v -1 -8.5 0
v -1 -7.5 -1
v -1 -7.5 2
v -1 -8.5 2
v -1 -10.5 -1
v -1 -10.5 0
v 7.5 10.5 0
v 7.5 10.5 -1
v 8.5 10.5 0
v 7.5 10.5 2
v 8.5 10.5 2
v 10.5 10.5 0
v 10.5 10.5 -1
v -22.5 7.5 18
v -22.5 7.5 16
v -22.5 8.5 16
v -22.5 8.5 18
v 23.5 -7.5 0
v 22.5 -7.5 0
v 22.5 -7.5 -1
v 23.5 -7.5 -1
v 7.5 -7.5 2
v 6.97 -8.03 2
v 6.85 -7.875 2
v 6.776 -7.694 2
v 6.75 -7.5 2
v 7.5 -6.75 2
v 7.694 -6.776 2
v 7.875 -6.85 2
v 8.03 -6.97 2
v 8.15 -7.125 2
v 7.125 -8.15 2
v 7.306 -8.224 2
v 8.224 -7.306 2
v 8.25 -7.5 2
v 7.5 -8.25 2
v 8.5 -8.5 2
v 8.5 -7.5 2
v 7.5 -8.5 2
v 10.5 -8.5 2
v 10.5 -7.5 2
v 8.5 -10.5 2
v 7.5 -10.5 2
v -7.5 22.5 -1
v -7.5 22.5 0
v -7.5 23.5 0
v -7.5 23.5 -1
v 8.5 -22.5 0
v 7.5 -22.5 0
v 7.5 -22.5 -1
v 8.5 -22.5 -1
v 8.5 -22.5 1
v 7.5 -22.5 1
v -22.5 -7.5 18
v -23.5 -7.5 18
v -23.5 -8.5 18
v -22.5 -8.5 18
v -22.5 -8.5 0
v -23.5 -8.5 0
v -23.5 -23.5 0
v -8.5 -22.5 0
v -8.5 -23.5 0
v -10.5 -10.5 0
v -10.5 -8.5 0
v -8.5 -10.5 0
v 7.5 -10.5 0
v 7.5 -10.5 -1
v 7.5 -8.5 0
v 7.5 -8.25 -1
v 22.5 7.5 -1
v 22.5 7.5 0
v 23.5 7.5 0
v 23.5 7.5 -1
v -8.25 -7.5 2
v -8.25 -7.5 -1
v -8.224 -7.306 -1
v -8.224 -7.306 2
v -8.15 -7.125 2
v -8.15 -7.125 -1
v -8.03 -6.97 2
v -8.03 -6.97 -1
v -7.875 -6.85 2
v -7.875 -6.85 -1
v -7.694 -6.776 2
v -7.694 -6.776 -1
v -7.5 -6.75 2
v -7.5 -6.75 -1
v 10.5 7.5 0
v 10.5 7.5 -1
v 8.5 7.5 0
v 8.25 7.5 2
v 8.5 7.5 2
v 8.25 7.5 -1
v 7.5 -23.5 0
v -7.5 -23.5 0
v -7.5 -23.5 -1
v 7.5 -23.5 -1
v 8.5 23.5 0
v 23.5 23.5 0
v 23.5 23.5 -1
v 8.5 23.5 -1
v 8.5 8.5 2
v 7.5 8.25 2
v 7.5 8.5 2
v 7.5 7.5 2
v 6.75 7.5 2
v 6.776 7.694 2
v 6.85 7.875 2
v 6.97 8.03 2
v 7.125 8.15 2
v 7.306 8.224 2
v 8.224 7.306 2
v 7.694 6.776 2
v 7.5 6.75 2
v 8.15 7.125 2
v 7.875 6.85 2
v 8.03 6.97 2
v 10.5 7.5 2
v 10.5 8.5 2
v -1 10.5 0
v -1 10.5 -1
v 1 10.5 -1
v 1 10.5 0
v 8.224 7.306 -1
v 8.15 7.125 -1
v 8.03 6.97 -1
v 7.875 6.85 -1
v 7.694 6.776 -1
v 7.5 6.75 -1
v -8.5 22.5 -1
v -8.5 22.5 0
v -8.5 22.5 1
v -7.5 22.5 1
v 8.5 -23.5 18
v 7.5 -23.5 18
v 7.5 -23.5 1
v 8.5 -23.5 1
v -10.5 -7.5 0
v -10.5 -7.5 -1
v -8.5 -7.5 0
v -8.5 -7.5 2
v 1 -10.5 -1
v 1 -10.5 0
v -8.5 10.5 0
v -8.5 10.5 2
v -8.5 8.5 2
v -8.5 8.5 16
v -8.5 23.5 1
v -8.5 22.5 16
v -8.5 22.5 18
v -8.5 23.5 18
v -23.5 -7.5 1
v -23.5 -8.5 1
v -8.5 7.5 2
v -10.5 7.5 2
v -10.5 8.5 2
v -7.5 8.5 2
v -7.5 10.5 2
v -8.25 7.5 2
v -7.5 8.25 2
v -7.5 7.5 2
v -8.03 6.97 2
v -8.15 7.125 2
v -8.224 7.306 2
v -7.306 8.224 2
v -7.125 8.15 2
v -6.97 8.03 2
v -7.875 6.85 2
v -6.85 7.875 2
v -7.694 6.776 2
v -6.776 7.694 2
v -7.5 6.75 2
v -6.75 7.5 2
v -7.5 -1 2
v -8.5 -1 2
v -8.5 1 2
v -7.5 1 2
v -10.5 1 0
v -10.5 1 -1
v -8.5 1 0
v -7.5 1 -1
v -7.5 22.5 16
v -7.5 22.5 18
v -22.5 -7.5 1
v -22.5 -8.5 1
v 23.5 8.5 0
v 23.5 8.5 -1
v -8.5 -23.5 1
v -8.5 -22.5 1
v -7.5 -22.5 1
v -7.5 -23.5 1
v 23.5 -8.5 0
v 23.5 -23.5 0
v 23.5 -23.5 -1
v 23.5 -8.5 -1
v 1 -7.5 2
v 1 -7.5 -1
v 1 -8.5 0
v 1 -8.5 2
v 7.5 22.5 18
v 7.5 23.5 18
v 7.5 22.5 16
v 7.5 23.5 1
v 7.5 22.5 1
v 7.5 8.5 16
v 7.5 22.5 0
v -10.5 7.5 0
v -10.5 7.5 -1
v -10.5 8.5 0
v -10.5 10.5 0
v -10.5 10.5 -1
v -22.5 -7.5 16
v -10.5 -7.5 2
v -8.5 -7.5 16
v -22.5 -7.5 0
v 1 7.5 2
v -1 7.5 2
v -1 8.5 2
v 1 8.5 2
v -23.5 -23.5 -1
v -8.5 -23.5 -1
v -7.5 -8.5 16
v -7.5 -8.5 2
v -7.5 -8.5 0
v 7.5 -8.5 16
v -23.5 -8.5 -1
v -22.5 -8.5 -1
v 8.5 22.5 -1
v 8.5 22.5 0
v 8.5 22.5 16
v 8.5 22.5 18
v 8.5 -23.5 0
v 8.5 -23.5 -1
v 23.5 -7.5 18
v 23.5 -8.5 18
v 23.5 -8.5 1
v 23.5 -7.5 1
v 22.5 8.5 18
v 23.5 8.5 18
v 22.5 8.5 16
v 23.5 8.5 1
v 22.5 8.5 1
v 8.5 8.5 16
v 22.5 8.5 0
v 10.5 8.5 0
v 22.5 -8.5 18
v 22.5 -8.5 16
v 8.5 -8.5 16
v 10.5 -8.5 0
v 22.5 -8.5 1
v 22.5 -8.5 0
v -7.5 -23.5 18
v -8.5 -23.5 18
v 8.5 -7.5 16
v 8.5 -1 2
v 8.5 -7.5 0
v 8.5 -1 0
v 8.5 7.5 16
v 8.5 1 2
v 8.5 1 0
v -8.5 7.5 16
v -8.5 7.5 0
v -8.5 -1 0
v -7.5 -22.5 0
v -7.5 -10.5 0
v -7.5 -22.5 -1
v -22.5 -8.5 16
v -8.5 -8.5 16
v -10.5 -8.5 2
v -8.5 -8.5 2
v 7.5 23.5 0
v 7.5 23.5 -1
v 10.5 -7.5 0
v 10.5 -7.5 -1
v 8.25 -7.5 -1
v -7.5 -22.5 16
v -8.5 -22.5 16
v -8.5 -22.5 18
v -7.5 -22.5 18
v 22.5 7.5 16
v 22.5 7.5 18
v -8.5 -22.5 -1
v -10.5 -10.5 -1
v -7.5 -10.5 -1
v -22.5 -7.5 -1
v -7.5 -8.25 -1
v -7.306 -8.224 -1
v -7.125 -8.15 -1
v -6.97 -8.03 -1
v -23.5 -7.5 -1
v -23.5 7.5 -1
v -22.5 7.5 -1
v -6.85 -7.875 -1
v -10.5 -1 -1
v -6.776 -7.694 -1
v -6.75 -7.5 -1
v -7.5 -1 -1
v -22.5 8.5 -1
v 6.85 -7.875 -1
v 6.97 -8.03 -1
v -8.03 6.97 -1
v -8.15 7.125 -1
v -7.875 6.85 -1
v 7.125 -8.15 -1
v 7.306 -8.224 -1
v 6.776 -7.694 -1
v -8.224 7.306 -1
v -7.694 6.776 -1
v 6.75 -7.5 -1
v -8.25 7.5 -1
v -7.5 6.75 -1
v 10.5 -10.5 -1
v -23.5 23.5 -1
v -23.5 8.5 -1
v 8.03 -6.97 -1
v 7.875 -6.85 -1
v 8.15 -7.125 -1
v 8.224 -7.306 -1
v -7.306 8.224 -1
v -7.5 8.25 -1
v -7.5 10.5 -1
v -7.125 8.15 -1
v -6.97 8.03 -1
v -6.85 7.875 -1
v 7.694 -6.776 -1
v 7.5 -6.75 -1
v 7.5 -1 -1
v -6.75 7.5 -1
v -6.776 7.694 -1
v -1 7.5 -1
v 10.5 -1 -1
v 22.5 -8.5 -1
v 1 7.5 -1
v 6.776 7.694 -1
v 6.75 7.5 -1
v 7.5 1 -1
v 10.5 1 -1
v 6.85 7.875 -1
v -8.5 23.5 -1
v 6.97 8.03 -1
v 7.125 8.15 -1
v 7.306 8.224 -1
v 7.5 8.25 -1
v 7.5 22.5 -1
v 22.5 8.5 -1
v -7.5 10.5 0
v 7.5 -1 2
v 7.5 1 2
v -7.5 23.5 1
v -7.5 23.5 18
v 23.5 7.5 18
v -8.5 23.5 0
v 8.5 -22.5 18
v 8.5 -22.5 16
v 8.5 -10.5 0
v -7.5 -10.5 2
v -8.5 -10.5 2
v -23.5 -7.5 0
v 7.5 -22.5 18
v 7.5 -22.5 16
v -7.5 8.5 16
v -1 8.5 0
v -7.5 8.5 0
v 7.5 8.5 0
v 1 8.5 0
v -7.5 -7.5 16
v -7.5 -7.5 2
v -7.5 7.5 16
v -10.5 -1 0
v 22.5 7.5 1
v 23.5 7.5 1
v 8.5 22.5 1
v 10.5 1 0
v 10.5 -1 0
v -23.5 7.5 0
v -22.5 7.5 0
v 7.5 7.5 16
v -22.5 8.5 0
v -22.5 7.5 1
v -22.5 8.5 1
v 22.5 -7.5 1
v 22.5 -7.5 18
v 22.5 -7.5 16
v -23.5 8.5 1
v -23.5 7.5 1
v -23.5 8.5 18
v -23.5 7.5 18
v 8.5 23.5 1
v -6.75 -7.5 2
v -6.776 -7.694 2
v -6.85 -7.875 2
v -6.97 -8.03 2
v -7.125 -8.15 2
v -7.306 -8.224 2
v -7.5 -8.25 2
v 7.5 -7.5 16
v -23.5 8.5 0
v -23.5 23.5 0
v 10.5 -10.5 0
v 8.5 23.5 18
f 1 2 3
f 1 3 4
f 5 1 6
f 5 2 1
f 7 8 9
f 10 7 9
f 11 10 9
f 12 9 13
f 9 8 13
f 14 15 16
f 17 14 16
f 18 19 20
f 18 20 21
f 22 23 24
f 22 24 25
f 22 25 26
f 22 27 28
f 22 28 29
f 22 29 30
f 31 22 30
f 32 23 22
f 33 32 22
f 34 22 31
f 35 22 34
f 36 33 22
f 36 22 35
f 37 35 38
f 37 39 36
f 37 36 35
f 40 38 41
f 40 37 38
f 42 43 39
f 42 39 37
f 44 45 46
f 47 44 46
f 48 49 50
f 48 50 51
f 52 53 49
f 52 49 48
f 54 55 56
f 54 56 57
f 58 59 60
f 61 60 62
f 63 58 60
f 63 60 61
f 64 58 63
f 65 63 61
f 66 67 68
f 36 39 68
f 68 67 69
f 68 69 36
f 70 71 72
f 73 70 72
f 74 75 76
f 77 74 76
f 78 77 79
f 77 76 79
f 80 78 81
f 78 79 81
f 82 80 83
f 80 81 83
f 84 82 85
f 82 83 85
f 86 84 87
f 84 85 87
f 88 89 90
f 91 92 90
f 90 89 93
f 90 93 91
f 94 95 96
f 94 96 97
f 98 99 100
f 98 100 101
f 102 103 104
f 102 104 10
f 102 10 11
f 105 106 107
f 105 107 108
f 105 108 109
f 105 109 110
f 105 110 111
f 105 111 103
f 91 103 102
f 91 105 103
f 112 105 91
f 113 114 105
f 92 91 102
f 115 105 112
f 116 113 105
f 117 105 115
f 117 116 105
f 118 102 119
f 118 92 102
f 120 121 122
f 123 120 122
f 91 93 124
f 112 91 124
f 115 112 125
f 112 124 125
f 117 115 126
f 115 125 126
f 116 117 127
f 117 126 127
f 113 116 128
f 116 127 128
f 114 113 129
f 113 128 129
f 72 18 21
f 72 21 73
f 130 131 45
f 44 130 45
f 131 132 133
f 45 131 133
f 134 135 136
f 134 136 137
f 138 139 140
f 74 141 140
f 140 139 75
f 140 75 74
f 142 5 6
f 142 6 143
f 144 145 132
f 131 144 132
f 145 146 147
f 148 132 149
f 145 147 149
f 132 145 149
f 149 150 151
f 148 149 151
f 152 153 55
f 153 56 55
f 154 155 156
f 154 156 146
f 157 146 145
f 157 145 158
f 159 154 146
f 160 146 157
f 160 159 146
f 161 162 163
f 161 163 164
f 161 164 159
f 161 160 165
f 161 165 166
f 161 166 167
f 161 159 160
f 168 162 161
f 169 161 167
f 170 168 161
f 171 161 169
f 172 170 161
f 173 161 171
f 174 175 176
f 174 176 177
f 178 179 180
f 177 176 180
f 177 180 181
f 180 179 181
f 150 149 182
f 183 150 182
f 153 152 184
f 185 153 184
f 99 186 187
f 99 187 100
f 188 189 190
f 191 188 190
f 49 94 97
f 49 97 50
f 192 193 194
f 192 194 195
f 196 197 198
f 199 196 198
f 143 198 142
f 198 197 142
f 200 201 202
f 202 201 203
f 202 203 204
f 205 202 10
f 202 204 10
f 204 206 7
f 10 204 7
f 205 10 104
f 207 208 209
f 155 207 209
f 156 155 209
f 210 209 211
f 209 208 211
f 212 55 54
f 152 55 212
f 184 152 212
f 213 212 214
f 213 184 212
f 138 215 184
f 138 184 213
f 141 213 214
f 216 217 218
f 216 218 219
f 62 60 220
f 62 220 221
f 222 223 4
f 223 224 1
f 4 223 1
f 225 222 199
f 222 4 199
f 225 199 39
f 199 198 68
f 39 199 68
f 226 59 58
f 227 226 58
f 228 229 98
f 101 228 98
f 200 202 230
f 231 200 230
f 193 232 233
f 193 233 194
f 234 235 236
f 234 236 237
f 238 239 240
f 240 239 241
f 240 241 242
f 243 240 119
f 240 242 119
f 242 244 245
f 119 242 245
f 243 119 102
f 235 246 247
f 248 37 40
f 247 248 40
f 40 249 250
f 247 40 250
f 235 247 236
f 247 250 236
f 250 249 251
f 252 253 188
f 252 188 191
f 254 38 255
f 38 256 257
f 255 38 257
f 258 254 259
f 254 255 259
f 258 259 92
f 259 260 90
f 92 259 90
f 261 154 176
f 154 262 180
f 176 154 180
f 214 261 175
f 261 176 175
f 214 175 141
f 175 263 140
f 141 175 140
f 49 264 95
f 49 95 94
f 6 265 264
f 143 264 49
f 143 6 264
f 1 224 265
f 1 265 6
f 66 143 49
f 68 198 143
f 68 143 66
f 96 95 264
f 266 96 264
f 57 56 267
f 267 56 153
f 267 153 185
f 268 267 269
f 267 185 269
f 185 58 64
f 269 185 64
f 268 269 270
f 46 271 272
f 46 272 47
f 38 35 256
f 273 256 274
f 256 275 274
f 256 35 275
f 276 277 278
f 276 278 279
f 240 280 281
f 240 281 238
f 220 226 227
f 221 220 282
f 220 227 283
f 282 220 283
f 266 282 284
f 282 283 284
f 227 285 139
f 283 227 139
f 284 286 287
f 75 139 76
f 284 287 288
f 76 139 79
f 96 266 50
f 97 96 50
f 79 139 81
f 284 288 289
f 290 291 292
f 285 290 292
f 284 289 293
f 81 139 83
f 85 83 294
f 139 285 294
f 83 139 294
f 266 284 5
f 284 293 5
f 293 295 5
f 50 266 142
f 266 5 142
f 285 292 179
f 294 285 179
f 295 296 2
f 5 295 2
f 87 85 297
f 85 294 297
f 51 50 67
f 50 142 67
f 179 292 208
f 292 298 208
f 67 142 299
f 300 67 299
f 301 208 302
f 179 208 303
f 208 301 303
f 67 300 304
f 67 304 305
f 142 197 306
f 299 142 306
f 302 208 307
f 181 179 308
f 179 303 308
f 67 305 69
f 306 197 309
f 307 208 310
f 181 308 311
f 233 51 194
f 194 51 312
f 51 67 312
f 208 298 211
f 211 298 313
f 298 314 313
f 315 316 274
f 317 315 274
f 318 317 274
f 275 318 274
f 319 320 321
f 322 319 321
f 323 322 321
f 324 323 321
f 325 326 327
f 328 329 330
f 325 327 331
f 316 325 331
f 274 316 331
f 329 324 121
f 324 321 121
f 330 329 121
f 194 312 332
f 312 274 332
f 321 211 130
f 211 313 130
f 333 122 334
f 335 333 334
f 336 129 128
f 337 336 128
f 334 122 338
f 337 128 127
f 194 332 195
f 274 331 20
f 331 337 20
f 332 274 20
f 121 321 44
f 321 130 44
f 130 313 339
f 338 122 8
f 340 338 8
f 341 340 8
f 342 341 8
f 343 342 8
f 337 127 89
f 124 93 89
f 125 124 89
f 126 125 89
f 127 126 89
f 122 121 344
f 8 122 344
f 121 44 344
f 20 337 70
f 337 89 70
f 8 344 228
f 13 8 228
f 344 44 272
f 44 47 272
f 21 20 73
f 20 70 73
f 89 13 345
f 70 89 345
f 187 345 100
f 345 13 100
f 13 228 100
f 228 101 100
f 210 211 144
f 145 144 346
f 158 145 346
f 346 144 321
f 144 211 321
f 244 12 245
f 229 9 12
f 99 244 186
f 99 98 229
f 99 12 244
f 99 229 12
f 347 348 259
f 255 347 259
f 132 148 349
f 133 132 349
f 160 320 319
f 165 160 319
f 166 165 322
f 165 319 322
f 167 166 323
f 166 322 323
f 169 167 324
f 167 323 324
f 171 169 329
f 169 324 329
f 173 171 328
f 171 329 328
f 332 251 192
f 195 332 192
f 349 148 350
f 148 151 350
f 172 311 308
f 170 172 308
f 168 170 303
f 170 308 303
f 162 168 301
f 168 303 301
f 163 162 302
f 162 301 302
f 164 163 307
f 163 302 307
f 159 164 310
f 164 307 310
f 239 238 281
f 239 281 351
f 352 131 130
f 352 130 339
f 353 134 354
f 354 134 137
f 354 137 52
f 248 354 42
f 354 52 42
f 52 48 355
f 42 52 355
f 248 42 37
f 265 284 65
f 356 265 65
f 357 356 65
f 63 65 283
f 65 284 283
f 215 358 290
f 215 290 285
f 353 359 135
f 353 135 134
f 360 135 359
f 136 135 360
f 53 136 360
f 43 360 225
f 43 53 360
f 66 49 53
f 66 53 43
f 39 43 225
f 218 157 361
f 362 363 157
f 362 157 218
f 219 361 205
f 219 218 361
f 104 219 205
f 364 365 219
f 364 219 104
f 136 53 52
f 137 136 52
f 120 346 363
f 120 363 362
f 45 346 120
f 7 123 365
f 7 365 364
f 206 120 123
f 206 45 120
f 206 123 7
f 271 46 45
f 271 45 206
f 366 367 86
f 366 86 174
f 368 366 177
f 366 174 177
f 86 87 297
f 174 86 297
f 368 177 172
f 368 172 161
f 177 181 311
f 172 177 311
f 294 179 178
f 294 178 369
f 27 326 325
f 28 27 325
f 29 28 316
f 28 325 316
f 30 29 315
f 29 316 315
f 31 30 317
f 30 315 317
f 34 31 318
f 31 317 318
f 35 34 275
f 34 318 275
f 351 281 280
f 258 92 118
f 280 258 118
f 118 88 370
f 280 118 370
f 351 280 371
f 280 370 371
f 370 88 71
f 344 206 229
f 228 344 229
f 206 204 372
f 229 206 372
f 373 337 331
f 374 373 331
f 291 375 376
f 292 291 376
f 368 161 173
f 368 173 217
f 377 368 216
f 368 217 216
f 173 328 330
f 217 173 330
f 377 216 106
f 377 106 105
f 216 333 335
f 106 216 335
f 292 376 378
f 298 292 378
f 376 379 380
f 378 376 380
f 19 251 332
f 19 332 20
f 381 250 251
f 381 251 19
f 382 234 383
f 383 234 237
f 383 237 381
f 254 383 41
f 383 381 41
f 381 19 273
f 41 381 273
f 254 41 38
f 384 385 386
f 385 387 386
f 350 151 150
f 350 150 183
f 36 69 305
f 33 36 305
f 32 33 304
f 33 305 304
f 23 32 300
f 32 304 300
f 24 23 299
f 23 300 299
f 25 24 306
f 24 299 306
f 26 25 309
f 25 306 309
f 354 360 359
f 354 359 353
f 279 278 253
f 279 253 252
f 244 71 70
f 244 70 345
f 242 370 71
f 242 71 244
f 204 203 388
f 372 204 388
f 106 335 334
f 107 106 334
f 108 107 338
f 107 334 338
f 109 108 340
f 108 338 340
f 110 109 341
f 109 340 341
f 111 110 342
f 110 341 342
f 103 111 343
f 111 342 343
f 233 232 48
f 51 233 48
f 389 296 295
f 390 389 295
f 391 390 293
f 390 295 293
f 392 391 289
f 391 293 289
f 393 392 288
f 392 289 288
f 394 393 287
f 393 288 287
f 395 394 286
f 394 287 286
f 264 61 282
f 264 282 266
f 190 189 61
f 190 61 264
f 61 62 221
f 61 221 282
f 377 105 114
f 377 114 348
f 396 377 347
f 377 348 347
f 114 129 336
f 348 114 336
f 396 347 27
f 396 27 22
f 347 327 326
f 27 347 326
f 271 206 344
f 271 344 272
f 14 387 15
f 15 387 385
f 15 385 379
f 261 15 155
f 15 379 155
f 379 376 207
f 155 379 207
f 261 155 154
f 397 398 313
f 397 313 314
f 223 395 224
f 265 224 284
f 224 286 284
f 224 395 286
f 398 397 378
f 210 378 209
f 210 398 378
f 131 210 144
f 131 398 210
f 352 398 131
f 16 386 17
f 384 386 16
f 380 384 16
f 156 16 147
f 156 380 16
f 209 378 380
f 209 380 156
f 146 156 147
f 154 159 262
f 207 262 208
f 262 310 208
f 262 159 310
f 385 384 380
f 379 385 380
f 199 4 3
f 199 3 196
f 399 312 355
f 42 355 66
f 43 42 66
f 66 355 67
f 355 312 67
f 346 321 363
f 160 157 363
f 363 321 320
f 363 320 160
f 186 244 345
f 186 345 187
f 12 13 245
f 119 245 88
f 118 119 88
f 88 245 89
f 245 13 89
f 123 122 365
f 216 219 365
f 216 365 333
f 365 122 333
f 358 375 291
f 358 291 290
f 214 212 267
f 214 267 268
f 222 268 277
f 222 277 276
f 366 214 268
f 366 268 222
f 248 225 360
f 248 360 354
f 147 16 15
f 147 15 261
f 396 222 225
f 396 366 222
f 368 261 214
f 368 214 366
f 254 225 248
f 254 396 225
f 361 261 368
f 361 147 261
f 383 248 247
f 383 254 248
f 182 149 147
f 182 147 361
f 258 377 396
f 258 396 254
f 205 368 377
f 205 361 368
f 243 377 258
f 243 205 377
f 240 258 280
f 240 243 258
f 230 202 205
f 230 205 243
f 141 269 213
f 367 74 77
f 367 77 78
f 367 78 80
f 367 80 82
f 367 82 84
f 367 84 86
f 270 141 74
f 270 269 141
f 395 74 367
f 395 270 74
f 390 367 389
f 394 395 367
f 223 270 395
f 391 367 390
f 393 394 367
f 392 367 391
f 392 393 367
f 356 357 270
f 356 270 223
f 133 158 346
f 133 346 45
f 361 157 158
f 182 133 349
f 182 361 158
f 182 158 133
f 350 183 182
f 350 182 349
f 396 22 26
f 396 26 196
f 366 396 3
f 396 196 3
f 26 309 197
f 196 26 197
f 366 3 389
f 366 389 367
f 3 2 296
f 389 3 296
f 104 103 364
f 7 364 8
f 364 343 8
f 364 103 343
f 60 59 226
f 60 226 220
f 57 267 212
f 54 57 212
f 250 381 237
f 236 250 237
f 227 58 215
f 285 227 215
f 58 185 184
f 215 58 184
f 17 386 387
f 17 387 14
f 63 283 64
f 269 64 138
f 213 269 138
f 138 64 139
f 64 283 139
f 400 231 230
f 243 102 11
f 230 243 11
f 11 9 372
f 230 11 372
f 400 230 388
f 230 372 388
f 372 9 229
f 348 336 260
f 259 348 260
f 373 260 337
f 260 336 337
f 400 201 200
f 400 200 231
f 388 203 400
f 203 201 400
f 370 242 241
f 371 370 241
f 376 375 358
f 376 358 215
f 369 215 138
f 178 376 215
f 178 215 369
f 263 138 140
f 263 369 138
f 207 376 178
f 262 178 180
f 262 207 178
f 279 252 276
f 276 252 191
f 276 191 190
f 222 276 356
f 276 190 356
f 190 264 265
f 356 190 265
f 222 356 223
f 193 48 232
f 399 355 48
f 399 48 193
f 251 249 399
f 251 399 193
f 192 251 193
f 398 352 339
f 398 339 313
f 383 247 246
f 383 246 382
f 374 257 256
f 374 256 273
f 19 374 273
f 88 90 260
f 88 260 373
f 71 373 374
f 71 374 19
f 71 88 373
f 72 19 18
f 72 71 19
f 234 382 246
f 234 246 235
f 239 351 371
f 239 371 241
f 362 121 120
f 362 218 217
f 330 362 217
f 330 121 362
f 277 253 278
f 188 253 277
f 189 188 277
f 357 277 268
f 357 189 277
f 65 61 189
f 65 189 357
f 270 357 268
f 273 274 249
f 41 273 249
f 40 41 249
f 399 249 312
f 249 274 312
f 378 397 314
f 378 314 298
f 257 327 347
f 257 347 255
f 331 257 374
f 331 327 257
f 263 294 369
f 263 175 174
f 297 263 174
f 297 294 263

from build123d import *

# Parameters (mm, degrees)
F0_W          = 1
F0_H          = 15
F0_W_2        = 15
F0_H_2        = 1
F1_DEPTH      = 1
F2_DEPTH      = 16
F3_W          = 2
F3_H          = 3
F3_W_2        = 3
F3_H_2        = 2
F4_DEPTH      = 3
F5_W          = 1
F5_H          = 1
F6_DEPTH      = 25
F7_DEPTH      = 2
F7_DEPTH_BACK = 15


with BuildPart() as f1:
    # F0 (on Top) → F1 (new body)
    with BuildSketch(Plane.XY):
        with Locations((8, 0)):
            Rectangle(F0_W, F0_H)
        with Locations((-16, -8)):
            Rectangle(F0_W_2, F0_H_2)
        with Locations((-16, 0)):
            Rectangle(F0_W_2, F0_H)
        with Locations((8, -16)):
            Rectangle(F0_W, F0_H)
        with Locations((0, -16)):
            Rectangle(F0_W_2, F0_H)
        with Locations((-8, -16)):
            Rectangle(F0_W, F0_H)
        with Locations((16, -16)):
            Rectangle(F0_W_2, F0_H)
        with Locations((-16, -16)):
            Rectangle(F0_W_2, F0_H)
        with Locations((16, 0)):
            Rectangle(F0_W_2, F0_H)
        with Locations((16, -8)):
            Rectangle(F0_W_2, F0_H_2)
        with Locations((0, -8)):
            Rectangle(F0_W_2, F0_H_2)
        with Locations((-8, 0)):
            Rectangle(F0_W, F0_H)
        Rectangle(F0_W_2, F0_H)
        with Locations((8, -8)):
            Rectangle(F0_W, F0_H_2)
        with Locations((-8, -8)):
            Rectangle(F0_W, F0_H_2)
        with Locations((-8, 8)):
            Rectangle(F0_W, F0_H_2)
        with Locations((-16, 8)):
            Rectangle(F0_W_2, F0_H_2)
        with Locations((8, 16)):
            Rectangle(F0_W, F0_H)
        with Locations((0, 16)):
            Rectangle(F0_W_2, F0_H)
        with Locations((-8, 16)):
            Rectangle(F0_W, F0_H)
        with Locations((16, 16)):
            Rectangle(F0_W_2, F0_H)
        with Locations((16, 8)):
            Rectangle(F0_W_2, F0_H_2)
        with Locations((-16, 16)):
            Rectangle(F0_W_2, F0_H)
        with Locations((8, 8)):
            Rectangle(F0_W, F0_H_2)
        with Locations((0, 8)):
            Rectangle(F0_W_2, F0_H_2)
    extrude(amount=-F1_DEPTH)

    # F0 (on Top) → F2 (join)
    with BuildSketch(Plane.XY):
        with Locations((-8, -8)):
            Rectangle(F0_W, F0_H_2)
        with Locations((8, -8)):
            Rectangle(F0_W, F0_H_2)
        with Locations((-8, 8)):
            Rectangle(F0_W, F0_H_2)
        with Locations((8, 8)):
            Rectangle(F0_W, F0_H_2)
        with Locations((16, 8)):
            Rectangle(F0_W_2, F0_H_2)
        with Locations((8, 16)):
            Rectangle(F0_W, F0_H)
        with Locations((-8, 16)):
            Rectangle(F0_W, F0_H)
        with Locations((0, 8)):
            Rectangle(F0_W_2, F0_H_2)
        with Locations((-16, 8)):
            Rectangle(F0_W_2, F0_H_2)
        with Locations((-8, 0)):
            Rectangle(F0_W, F0_H)
        with Locations((-16, -8)):
            Rectangle(F0_W_2, F0_H_2)
        with Locations((0, -8)):
            Rectangle(F0_W_2, F0_H_2)
        with Locations((16, -8)):
            Rectangle(F0_W_2, F0_H_2)
        with Locations((8, -16)):
            Rectangle(F0_W, F0_H)
        with Locations((-8, -16)):
            Rectangle(F0_W, F0_H)
        with Locations((8, 0)):
            Rectangle(F0_W, F0_H)
    extrude(amount=F2_DEPTH)

    # F3 (on face) → F4 (cut)
    with BuildSketch(Plane(origin=(0, 0, -1), x_dir=(1, 0, 0), z_dir=(0, 0, -1))):
        with BuildLine():
            Line((-7.5, 8.25), (-7.5, 7.5))
            Line((-7.5, 7.5), (-6.75, 7.5))
            ThreePointArc((-6.75, 7.5), (-6.9696699141, 8.0303300859), (-7.5, 8.25))
        make_face()
        with BuildLine():
            Line((-6.75, 7.5), (-7.5, 7.5))
            Line((-7.5, 7.5), (-7.5, 6.75))
            ThreePointArc((-7.5, 6.75), (-6.9696699141, 6.9696699141), (-6.75, 7.5))
        make_face()
        with BuildLine():
            Line((-7.5, 6.75), (-7.5, 7.5))
            Line((-7.5, 7.5), (-8.25, 7.5))
            ThreePointArc((-8.25, 7.5), (-8.0303300859, 6.9696699141), (-7.5, 6.75))
        make_face()
        with BuildLine():
            Line((-8.25, 7.5), (-7.5, 7.5))
            Line((-7.5, 7.5), (-7.5, 8.25))
            ThreePointArc((-7.5, 8.25), (-8.0303300859, 8.0303300859), (-8.25, 7.5))
        make_face()
        with BuildLine():
            Line((-1, 7.5), (-6.75, 7.5))
            ThreePointArc((-6.75, 7.5), (-6.9696699141, 6.9696699141), (-7.5, 6.75))
            Line((-7.5, 6.75), (-7.5, 1))
            Line((-7.5, 1), (-7.5, -1))
            Line((-7.5, -1), (-7.5, -6.75))
            ThreePointArc((-7.5, -6.75), (-6.9696699141, -6.9696699141), (-6.75, -7.5))
            Line((-6.75, -7.5), (-1, -7.5))
            Line((-1, -7.5), (1, -7.5))
            Line((1, -7.5), (6.75, -7.5))
            ThreePointArc((6.75, -7.5), (6.9696699141, -6.9696699141), (7.5, -6.75))
            Line((7.5, -6.75), (7.5, -1))
            Line((7.5, -1), (7.5, 1))
            Line((7.5, 1), (7.5, 6.75))
            ThreePointArc((7.5, 6.75), (6.9696699141, 6.9696699141), (6.75, 7.5))
            Line((6.75, 7.5), (1, 7.5))
            Line((1, 7.5), (-1, 7.5))
        make_face()
        with BuildLine():
            Line((-10.5, 7.5), (-8.25, 7.5))
            ThreePointArc((-8.25, 7.5), (-8.0303300859, 8.0303300859), (-7.5, 8.25))
            Line((-7.5, 8.25), (-7.5, 10.5))
            Line((-7.5, 10.5), (-10.5, 10.5))
            Line((-10.5, 10.5), (-10.5, 7.5))
        make_face()
        with Locations((0, 9)):
            Rectangle(F3_W, F3_H)
        with Locations((-9, 0)):
            Rectangle(F3_W_2, F3_H_2)
        with BuildLine():
            ThreePointArc((7.5, 8.25), (6.9696699141, 8.0303300859), (6.75, 7.5))
            Line((6.75, 7.5), (7.5, 7.5))
            Line((7.5, 7.5), (7.5, 8.25))
        make_face()
        with BuildLine():
            Line((7.5, 7.5), (6.75, 7.5))
            ThreePointArc((6.75, 7.5), (6.9696699141, 6.9696699141), (7.5, 6.75))
            Line((7.5, 6.75), (7.5, 7.5))
        make_face()
        with BuildLine():
            ThreePointArc((-6.75, -7.5), (-6.9696699141, -6.9696699141), (-7.5, -6.75))
            Line((-7.5, -6.75), (-7.5, -7.5))
            Line((-7.5, -7.5), (-6.75, -7.5))
        make_face()
        with BuildLine():
            Line((-7.5, -7.5), (-7.5, -6.75))
            ThreePointArc((-7.5, -6.75), (-8.0303300859, -6.9696699141), (-8.25, -7.5))
            Line((-8.25, -7.5), (-7.5, -7.5))
        make_face()
        with BuildLine():
            Line((8.25, 7.5), (7.5, 7.5))
            Line((7.5, 7.5), (7.5, 6.75))
            ThreePointArc((7.5, 6.75), (8.0303300859, 6.9696699141), (8.25, 7.5))
        make_face()
        with BuildLine():
            Line((7.5, 8.25), (7.5, 7.5))
            Line((7.5, 7.5), (8.25, 7.5))
            ThreePointArc((8.25, 7.5), (8.0303300859, 8.0303300859), (7.5, 8.25))
        make_face()
        with BuildLine():
            Line((7.5, 10.5), (7.5, 8.25))
            ThreePointArc((7.5, 8.25), (8.0303300859, 8.0303300859), (8.25, 7.5))
            Line((8.25, 7.5), (10.5, 7.5))
            Line((10.5, 7.5), (10.5, 10.5))
            Line((10.5, 10.5), (7.5, 10.5))
        make_face()
        with BuildLine():
            Line((-7.5, -8.25), (-7.5, -7.5))
            Line((-7.5, -7.5), (-8.25, -7.5))
            ThreePointArc((-8.25, -7.5), (-8.0303300859, -8.0303300859), (-7.5, -8.25))
        make_face()
        with BuildLine():
            Line((-6.75, -7.5), (-7.5, -7.5))
            Line((-7.5, -7.5), (-7.5, -8.25))
            ThreePointArc((-7.5, -8.25), (-6.9696699141, -8.0303300859), (-6.75, -7.5))
        make_face()
        with BuildLine():
            ThreePointArc((-7.5, -8.25), (-8.0303300859, -8.0303300859), (-8.25, -7.5))
            Line((-8.25, -7.5), (-10.5, -7.5))
            Line((-10.5, -7.5), (-10.5, -10.5))
            Line((-10.5, -10.5), (-7.5, -10.5))
            Line((-7.5, -10.5), (-7.5, -8.25))
        make_face()
        with Locations((9, 0)):
            Rectangle(F3_W_2, F3_H_2)
        with Locations((0, -9)):
            Rectangle(F3_W, F3_H)
        with BuildLine():
            ThreePointArc((8.25, -7.5), (8.0303300859, -6.9696699141), (7.5, -6.75))
            Line((7.5, -6.75), (7.5, -7.5))
            Line((7.5, -7.5), (8.25, -7.5))
        make_face()
        with BuildLine():
            Line((7.5, -7.5), (7.5, -6.75))
            ThreePointArc((7.5, -6.75), (6.9696699141, -6.9696699141), (6.75, -7.5))
            Line((6.75, -7.5), (7.5, -7.5))
        make_face()
        with BuildLine():
            Line((7.5, -7.5), (6.75, -7.5))
            ThreePointArc((6.75, -7.5), (6.9696699141, -8.0303300859), (7.5, -8.25))
            Line((7.5, -8.25), (7.5, -7.5))
        make_face()
        with BuildLine():
            Line((8.25, -7.5), (7.5, -7.5))
            Line((7.5, -7.5), (7.5, -8.25))
            ThreePointArc((7.5, -8.25), (8.0303300859, -8.0303300859), (8.25, -7.5))
        make_face()
        with BuildLine():
            Line((10.5, -7.5), (8.25, -7.5))
            ThreePointArc((8.25, -7.5), (8.0303300859, -8.0303300859), (7.5, -8.25))
            Line((7.5, -8.25), (7.5, -10.5))
            Line((7.5, -10.5), (10.5, -10.5))
            Line((10.5, -10.5), (10.5, -7.5))
        make_face()
    extrude(amount=-F4_DEPTH, mode=Mode.SUBTRACT)

    # F5 (on face) → F6 (cut)
    with BuildSketch(Plane.XY.offset(16)):
        with Locations((-8, 23)):
            Rectangle(F5_W, F5_H)
        with Locations((-23, 8)):
            Rectangle(F5_W, F5_H)
        with Locations((8, 23)):
            Rectangle(F5_W, F5_H)
        with Locations((23, 8)):
            Rectangle(F5_W, F5_H)
        with Locations((23, -8)):
            Rectangle(F5_W, F5_H)
        with Locations((8, -23)):
            Rectangle(F5_W, F5_H)
        with Locations((-8, -23)):
            Rectangle(F5_W, F5_H)
        with Locations((-23, -8)):
            Rectangle(F5_W, F5_H)
    extrude(amount=-F6_DEPTH, mode=Mode.SUBTRACT)

    # F5 (on face) → F7 (join, two sides)
    with BuildSketch(Plane.XY.offset(16)) as f7_sk:
        with Locations((-8, 23)):
            Rectangle(F5_W, F5_H)
        with Locations((-23, 8)):
            Rectangle(F5_W, F5_H)
        with Locations((8, 23)):
            Rectangle(F5_W, F5_H)
        with Locations((23, 8)):
            Rectangle(F5_W, F5_H)
        with Locations((23, -8)):
            Rectangle(F5_W, F5_H)
        with Locations((8, -23)):
            Rectangle(F5_W, F5_H)
        with Locations((-8, -23)):
            Rectangle(F5_W, F5_H)
        with Locations((-23, -8)):
            Rectangle(F5_W, F5_H)
    extrude(amount=F7_DEPTH)
    extrude(f7_sk.sketch, amount=-F7_DEPTH_BACK)


solid = f1.part
